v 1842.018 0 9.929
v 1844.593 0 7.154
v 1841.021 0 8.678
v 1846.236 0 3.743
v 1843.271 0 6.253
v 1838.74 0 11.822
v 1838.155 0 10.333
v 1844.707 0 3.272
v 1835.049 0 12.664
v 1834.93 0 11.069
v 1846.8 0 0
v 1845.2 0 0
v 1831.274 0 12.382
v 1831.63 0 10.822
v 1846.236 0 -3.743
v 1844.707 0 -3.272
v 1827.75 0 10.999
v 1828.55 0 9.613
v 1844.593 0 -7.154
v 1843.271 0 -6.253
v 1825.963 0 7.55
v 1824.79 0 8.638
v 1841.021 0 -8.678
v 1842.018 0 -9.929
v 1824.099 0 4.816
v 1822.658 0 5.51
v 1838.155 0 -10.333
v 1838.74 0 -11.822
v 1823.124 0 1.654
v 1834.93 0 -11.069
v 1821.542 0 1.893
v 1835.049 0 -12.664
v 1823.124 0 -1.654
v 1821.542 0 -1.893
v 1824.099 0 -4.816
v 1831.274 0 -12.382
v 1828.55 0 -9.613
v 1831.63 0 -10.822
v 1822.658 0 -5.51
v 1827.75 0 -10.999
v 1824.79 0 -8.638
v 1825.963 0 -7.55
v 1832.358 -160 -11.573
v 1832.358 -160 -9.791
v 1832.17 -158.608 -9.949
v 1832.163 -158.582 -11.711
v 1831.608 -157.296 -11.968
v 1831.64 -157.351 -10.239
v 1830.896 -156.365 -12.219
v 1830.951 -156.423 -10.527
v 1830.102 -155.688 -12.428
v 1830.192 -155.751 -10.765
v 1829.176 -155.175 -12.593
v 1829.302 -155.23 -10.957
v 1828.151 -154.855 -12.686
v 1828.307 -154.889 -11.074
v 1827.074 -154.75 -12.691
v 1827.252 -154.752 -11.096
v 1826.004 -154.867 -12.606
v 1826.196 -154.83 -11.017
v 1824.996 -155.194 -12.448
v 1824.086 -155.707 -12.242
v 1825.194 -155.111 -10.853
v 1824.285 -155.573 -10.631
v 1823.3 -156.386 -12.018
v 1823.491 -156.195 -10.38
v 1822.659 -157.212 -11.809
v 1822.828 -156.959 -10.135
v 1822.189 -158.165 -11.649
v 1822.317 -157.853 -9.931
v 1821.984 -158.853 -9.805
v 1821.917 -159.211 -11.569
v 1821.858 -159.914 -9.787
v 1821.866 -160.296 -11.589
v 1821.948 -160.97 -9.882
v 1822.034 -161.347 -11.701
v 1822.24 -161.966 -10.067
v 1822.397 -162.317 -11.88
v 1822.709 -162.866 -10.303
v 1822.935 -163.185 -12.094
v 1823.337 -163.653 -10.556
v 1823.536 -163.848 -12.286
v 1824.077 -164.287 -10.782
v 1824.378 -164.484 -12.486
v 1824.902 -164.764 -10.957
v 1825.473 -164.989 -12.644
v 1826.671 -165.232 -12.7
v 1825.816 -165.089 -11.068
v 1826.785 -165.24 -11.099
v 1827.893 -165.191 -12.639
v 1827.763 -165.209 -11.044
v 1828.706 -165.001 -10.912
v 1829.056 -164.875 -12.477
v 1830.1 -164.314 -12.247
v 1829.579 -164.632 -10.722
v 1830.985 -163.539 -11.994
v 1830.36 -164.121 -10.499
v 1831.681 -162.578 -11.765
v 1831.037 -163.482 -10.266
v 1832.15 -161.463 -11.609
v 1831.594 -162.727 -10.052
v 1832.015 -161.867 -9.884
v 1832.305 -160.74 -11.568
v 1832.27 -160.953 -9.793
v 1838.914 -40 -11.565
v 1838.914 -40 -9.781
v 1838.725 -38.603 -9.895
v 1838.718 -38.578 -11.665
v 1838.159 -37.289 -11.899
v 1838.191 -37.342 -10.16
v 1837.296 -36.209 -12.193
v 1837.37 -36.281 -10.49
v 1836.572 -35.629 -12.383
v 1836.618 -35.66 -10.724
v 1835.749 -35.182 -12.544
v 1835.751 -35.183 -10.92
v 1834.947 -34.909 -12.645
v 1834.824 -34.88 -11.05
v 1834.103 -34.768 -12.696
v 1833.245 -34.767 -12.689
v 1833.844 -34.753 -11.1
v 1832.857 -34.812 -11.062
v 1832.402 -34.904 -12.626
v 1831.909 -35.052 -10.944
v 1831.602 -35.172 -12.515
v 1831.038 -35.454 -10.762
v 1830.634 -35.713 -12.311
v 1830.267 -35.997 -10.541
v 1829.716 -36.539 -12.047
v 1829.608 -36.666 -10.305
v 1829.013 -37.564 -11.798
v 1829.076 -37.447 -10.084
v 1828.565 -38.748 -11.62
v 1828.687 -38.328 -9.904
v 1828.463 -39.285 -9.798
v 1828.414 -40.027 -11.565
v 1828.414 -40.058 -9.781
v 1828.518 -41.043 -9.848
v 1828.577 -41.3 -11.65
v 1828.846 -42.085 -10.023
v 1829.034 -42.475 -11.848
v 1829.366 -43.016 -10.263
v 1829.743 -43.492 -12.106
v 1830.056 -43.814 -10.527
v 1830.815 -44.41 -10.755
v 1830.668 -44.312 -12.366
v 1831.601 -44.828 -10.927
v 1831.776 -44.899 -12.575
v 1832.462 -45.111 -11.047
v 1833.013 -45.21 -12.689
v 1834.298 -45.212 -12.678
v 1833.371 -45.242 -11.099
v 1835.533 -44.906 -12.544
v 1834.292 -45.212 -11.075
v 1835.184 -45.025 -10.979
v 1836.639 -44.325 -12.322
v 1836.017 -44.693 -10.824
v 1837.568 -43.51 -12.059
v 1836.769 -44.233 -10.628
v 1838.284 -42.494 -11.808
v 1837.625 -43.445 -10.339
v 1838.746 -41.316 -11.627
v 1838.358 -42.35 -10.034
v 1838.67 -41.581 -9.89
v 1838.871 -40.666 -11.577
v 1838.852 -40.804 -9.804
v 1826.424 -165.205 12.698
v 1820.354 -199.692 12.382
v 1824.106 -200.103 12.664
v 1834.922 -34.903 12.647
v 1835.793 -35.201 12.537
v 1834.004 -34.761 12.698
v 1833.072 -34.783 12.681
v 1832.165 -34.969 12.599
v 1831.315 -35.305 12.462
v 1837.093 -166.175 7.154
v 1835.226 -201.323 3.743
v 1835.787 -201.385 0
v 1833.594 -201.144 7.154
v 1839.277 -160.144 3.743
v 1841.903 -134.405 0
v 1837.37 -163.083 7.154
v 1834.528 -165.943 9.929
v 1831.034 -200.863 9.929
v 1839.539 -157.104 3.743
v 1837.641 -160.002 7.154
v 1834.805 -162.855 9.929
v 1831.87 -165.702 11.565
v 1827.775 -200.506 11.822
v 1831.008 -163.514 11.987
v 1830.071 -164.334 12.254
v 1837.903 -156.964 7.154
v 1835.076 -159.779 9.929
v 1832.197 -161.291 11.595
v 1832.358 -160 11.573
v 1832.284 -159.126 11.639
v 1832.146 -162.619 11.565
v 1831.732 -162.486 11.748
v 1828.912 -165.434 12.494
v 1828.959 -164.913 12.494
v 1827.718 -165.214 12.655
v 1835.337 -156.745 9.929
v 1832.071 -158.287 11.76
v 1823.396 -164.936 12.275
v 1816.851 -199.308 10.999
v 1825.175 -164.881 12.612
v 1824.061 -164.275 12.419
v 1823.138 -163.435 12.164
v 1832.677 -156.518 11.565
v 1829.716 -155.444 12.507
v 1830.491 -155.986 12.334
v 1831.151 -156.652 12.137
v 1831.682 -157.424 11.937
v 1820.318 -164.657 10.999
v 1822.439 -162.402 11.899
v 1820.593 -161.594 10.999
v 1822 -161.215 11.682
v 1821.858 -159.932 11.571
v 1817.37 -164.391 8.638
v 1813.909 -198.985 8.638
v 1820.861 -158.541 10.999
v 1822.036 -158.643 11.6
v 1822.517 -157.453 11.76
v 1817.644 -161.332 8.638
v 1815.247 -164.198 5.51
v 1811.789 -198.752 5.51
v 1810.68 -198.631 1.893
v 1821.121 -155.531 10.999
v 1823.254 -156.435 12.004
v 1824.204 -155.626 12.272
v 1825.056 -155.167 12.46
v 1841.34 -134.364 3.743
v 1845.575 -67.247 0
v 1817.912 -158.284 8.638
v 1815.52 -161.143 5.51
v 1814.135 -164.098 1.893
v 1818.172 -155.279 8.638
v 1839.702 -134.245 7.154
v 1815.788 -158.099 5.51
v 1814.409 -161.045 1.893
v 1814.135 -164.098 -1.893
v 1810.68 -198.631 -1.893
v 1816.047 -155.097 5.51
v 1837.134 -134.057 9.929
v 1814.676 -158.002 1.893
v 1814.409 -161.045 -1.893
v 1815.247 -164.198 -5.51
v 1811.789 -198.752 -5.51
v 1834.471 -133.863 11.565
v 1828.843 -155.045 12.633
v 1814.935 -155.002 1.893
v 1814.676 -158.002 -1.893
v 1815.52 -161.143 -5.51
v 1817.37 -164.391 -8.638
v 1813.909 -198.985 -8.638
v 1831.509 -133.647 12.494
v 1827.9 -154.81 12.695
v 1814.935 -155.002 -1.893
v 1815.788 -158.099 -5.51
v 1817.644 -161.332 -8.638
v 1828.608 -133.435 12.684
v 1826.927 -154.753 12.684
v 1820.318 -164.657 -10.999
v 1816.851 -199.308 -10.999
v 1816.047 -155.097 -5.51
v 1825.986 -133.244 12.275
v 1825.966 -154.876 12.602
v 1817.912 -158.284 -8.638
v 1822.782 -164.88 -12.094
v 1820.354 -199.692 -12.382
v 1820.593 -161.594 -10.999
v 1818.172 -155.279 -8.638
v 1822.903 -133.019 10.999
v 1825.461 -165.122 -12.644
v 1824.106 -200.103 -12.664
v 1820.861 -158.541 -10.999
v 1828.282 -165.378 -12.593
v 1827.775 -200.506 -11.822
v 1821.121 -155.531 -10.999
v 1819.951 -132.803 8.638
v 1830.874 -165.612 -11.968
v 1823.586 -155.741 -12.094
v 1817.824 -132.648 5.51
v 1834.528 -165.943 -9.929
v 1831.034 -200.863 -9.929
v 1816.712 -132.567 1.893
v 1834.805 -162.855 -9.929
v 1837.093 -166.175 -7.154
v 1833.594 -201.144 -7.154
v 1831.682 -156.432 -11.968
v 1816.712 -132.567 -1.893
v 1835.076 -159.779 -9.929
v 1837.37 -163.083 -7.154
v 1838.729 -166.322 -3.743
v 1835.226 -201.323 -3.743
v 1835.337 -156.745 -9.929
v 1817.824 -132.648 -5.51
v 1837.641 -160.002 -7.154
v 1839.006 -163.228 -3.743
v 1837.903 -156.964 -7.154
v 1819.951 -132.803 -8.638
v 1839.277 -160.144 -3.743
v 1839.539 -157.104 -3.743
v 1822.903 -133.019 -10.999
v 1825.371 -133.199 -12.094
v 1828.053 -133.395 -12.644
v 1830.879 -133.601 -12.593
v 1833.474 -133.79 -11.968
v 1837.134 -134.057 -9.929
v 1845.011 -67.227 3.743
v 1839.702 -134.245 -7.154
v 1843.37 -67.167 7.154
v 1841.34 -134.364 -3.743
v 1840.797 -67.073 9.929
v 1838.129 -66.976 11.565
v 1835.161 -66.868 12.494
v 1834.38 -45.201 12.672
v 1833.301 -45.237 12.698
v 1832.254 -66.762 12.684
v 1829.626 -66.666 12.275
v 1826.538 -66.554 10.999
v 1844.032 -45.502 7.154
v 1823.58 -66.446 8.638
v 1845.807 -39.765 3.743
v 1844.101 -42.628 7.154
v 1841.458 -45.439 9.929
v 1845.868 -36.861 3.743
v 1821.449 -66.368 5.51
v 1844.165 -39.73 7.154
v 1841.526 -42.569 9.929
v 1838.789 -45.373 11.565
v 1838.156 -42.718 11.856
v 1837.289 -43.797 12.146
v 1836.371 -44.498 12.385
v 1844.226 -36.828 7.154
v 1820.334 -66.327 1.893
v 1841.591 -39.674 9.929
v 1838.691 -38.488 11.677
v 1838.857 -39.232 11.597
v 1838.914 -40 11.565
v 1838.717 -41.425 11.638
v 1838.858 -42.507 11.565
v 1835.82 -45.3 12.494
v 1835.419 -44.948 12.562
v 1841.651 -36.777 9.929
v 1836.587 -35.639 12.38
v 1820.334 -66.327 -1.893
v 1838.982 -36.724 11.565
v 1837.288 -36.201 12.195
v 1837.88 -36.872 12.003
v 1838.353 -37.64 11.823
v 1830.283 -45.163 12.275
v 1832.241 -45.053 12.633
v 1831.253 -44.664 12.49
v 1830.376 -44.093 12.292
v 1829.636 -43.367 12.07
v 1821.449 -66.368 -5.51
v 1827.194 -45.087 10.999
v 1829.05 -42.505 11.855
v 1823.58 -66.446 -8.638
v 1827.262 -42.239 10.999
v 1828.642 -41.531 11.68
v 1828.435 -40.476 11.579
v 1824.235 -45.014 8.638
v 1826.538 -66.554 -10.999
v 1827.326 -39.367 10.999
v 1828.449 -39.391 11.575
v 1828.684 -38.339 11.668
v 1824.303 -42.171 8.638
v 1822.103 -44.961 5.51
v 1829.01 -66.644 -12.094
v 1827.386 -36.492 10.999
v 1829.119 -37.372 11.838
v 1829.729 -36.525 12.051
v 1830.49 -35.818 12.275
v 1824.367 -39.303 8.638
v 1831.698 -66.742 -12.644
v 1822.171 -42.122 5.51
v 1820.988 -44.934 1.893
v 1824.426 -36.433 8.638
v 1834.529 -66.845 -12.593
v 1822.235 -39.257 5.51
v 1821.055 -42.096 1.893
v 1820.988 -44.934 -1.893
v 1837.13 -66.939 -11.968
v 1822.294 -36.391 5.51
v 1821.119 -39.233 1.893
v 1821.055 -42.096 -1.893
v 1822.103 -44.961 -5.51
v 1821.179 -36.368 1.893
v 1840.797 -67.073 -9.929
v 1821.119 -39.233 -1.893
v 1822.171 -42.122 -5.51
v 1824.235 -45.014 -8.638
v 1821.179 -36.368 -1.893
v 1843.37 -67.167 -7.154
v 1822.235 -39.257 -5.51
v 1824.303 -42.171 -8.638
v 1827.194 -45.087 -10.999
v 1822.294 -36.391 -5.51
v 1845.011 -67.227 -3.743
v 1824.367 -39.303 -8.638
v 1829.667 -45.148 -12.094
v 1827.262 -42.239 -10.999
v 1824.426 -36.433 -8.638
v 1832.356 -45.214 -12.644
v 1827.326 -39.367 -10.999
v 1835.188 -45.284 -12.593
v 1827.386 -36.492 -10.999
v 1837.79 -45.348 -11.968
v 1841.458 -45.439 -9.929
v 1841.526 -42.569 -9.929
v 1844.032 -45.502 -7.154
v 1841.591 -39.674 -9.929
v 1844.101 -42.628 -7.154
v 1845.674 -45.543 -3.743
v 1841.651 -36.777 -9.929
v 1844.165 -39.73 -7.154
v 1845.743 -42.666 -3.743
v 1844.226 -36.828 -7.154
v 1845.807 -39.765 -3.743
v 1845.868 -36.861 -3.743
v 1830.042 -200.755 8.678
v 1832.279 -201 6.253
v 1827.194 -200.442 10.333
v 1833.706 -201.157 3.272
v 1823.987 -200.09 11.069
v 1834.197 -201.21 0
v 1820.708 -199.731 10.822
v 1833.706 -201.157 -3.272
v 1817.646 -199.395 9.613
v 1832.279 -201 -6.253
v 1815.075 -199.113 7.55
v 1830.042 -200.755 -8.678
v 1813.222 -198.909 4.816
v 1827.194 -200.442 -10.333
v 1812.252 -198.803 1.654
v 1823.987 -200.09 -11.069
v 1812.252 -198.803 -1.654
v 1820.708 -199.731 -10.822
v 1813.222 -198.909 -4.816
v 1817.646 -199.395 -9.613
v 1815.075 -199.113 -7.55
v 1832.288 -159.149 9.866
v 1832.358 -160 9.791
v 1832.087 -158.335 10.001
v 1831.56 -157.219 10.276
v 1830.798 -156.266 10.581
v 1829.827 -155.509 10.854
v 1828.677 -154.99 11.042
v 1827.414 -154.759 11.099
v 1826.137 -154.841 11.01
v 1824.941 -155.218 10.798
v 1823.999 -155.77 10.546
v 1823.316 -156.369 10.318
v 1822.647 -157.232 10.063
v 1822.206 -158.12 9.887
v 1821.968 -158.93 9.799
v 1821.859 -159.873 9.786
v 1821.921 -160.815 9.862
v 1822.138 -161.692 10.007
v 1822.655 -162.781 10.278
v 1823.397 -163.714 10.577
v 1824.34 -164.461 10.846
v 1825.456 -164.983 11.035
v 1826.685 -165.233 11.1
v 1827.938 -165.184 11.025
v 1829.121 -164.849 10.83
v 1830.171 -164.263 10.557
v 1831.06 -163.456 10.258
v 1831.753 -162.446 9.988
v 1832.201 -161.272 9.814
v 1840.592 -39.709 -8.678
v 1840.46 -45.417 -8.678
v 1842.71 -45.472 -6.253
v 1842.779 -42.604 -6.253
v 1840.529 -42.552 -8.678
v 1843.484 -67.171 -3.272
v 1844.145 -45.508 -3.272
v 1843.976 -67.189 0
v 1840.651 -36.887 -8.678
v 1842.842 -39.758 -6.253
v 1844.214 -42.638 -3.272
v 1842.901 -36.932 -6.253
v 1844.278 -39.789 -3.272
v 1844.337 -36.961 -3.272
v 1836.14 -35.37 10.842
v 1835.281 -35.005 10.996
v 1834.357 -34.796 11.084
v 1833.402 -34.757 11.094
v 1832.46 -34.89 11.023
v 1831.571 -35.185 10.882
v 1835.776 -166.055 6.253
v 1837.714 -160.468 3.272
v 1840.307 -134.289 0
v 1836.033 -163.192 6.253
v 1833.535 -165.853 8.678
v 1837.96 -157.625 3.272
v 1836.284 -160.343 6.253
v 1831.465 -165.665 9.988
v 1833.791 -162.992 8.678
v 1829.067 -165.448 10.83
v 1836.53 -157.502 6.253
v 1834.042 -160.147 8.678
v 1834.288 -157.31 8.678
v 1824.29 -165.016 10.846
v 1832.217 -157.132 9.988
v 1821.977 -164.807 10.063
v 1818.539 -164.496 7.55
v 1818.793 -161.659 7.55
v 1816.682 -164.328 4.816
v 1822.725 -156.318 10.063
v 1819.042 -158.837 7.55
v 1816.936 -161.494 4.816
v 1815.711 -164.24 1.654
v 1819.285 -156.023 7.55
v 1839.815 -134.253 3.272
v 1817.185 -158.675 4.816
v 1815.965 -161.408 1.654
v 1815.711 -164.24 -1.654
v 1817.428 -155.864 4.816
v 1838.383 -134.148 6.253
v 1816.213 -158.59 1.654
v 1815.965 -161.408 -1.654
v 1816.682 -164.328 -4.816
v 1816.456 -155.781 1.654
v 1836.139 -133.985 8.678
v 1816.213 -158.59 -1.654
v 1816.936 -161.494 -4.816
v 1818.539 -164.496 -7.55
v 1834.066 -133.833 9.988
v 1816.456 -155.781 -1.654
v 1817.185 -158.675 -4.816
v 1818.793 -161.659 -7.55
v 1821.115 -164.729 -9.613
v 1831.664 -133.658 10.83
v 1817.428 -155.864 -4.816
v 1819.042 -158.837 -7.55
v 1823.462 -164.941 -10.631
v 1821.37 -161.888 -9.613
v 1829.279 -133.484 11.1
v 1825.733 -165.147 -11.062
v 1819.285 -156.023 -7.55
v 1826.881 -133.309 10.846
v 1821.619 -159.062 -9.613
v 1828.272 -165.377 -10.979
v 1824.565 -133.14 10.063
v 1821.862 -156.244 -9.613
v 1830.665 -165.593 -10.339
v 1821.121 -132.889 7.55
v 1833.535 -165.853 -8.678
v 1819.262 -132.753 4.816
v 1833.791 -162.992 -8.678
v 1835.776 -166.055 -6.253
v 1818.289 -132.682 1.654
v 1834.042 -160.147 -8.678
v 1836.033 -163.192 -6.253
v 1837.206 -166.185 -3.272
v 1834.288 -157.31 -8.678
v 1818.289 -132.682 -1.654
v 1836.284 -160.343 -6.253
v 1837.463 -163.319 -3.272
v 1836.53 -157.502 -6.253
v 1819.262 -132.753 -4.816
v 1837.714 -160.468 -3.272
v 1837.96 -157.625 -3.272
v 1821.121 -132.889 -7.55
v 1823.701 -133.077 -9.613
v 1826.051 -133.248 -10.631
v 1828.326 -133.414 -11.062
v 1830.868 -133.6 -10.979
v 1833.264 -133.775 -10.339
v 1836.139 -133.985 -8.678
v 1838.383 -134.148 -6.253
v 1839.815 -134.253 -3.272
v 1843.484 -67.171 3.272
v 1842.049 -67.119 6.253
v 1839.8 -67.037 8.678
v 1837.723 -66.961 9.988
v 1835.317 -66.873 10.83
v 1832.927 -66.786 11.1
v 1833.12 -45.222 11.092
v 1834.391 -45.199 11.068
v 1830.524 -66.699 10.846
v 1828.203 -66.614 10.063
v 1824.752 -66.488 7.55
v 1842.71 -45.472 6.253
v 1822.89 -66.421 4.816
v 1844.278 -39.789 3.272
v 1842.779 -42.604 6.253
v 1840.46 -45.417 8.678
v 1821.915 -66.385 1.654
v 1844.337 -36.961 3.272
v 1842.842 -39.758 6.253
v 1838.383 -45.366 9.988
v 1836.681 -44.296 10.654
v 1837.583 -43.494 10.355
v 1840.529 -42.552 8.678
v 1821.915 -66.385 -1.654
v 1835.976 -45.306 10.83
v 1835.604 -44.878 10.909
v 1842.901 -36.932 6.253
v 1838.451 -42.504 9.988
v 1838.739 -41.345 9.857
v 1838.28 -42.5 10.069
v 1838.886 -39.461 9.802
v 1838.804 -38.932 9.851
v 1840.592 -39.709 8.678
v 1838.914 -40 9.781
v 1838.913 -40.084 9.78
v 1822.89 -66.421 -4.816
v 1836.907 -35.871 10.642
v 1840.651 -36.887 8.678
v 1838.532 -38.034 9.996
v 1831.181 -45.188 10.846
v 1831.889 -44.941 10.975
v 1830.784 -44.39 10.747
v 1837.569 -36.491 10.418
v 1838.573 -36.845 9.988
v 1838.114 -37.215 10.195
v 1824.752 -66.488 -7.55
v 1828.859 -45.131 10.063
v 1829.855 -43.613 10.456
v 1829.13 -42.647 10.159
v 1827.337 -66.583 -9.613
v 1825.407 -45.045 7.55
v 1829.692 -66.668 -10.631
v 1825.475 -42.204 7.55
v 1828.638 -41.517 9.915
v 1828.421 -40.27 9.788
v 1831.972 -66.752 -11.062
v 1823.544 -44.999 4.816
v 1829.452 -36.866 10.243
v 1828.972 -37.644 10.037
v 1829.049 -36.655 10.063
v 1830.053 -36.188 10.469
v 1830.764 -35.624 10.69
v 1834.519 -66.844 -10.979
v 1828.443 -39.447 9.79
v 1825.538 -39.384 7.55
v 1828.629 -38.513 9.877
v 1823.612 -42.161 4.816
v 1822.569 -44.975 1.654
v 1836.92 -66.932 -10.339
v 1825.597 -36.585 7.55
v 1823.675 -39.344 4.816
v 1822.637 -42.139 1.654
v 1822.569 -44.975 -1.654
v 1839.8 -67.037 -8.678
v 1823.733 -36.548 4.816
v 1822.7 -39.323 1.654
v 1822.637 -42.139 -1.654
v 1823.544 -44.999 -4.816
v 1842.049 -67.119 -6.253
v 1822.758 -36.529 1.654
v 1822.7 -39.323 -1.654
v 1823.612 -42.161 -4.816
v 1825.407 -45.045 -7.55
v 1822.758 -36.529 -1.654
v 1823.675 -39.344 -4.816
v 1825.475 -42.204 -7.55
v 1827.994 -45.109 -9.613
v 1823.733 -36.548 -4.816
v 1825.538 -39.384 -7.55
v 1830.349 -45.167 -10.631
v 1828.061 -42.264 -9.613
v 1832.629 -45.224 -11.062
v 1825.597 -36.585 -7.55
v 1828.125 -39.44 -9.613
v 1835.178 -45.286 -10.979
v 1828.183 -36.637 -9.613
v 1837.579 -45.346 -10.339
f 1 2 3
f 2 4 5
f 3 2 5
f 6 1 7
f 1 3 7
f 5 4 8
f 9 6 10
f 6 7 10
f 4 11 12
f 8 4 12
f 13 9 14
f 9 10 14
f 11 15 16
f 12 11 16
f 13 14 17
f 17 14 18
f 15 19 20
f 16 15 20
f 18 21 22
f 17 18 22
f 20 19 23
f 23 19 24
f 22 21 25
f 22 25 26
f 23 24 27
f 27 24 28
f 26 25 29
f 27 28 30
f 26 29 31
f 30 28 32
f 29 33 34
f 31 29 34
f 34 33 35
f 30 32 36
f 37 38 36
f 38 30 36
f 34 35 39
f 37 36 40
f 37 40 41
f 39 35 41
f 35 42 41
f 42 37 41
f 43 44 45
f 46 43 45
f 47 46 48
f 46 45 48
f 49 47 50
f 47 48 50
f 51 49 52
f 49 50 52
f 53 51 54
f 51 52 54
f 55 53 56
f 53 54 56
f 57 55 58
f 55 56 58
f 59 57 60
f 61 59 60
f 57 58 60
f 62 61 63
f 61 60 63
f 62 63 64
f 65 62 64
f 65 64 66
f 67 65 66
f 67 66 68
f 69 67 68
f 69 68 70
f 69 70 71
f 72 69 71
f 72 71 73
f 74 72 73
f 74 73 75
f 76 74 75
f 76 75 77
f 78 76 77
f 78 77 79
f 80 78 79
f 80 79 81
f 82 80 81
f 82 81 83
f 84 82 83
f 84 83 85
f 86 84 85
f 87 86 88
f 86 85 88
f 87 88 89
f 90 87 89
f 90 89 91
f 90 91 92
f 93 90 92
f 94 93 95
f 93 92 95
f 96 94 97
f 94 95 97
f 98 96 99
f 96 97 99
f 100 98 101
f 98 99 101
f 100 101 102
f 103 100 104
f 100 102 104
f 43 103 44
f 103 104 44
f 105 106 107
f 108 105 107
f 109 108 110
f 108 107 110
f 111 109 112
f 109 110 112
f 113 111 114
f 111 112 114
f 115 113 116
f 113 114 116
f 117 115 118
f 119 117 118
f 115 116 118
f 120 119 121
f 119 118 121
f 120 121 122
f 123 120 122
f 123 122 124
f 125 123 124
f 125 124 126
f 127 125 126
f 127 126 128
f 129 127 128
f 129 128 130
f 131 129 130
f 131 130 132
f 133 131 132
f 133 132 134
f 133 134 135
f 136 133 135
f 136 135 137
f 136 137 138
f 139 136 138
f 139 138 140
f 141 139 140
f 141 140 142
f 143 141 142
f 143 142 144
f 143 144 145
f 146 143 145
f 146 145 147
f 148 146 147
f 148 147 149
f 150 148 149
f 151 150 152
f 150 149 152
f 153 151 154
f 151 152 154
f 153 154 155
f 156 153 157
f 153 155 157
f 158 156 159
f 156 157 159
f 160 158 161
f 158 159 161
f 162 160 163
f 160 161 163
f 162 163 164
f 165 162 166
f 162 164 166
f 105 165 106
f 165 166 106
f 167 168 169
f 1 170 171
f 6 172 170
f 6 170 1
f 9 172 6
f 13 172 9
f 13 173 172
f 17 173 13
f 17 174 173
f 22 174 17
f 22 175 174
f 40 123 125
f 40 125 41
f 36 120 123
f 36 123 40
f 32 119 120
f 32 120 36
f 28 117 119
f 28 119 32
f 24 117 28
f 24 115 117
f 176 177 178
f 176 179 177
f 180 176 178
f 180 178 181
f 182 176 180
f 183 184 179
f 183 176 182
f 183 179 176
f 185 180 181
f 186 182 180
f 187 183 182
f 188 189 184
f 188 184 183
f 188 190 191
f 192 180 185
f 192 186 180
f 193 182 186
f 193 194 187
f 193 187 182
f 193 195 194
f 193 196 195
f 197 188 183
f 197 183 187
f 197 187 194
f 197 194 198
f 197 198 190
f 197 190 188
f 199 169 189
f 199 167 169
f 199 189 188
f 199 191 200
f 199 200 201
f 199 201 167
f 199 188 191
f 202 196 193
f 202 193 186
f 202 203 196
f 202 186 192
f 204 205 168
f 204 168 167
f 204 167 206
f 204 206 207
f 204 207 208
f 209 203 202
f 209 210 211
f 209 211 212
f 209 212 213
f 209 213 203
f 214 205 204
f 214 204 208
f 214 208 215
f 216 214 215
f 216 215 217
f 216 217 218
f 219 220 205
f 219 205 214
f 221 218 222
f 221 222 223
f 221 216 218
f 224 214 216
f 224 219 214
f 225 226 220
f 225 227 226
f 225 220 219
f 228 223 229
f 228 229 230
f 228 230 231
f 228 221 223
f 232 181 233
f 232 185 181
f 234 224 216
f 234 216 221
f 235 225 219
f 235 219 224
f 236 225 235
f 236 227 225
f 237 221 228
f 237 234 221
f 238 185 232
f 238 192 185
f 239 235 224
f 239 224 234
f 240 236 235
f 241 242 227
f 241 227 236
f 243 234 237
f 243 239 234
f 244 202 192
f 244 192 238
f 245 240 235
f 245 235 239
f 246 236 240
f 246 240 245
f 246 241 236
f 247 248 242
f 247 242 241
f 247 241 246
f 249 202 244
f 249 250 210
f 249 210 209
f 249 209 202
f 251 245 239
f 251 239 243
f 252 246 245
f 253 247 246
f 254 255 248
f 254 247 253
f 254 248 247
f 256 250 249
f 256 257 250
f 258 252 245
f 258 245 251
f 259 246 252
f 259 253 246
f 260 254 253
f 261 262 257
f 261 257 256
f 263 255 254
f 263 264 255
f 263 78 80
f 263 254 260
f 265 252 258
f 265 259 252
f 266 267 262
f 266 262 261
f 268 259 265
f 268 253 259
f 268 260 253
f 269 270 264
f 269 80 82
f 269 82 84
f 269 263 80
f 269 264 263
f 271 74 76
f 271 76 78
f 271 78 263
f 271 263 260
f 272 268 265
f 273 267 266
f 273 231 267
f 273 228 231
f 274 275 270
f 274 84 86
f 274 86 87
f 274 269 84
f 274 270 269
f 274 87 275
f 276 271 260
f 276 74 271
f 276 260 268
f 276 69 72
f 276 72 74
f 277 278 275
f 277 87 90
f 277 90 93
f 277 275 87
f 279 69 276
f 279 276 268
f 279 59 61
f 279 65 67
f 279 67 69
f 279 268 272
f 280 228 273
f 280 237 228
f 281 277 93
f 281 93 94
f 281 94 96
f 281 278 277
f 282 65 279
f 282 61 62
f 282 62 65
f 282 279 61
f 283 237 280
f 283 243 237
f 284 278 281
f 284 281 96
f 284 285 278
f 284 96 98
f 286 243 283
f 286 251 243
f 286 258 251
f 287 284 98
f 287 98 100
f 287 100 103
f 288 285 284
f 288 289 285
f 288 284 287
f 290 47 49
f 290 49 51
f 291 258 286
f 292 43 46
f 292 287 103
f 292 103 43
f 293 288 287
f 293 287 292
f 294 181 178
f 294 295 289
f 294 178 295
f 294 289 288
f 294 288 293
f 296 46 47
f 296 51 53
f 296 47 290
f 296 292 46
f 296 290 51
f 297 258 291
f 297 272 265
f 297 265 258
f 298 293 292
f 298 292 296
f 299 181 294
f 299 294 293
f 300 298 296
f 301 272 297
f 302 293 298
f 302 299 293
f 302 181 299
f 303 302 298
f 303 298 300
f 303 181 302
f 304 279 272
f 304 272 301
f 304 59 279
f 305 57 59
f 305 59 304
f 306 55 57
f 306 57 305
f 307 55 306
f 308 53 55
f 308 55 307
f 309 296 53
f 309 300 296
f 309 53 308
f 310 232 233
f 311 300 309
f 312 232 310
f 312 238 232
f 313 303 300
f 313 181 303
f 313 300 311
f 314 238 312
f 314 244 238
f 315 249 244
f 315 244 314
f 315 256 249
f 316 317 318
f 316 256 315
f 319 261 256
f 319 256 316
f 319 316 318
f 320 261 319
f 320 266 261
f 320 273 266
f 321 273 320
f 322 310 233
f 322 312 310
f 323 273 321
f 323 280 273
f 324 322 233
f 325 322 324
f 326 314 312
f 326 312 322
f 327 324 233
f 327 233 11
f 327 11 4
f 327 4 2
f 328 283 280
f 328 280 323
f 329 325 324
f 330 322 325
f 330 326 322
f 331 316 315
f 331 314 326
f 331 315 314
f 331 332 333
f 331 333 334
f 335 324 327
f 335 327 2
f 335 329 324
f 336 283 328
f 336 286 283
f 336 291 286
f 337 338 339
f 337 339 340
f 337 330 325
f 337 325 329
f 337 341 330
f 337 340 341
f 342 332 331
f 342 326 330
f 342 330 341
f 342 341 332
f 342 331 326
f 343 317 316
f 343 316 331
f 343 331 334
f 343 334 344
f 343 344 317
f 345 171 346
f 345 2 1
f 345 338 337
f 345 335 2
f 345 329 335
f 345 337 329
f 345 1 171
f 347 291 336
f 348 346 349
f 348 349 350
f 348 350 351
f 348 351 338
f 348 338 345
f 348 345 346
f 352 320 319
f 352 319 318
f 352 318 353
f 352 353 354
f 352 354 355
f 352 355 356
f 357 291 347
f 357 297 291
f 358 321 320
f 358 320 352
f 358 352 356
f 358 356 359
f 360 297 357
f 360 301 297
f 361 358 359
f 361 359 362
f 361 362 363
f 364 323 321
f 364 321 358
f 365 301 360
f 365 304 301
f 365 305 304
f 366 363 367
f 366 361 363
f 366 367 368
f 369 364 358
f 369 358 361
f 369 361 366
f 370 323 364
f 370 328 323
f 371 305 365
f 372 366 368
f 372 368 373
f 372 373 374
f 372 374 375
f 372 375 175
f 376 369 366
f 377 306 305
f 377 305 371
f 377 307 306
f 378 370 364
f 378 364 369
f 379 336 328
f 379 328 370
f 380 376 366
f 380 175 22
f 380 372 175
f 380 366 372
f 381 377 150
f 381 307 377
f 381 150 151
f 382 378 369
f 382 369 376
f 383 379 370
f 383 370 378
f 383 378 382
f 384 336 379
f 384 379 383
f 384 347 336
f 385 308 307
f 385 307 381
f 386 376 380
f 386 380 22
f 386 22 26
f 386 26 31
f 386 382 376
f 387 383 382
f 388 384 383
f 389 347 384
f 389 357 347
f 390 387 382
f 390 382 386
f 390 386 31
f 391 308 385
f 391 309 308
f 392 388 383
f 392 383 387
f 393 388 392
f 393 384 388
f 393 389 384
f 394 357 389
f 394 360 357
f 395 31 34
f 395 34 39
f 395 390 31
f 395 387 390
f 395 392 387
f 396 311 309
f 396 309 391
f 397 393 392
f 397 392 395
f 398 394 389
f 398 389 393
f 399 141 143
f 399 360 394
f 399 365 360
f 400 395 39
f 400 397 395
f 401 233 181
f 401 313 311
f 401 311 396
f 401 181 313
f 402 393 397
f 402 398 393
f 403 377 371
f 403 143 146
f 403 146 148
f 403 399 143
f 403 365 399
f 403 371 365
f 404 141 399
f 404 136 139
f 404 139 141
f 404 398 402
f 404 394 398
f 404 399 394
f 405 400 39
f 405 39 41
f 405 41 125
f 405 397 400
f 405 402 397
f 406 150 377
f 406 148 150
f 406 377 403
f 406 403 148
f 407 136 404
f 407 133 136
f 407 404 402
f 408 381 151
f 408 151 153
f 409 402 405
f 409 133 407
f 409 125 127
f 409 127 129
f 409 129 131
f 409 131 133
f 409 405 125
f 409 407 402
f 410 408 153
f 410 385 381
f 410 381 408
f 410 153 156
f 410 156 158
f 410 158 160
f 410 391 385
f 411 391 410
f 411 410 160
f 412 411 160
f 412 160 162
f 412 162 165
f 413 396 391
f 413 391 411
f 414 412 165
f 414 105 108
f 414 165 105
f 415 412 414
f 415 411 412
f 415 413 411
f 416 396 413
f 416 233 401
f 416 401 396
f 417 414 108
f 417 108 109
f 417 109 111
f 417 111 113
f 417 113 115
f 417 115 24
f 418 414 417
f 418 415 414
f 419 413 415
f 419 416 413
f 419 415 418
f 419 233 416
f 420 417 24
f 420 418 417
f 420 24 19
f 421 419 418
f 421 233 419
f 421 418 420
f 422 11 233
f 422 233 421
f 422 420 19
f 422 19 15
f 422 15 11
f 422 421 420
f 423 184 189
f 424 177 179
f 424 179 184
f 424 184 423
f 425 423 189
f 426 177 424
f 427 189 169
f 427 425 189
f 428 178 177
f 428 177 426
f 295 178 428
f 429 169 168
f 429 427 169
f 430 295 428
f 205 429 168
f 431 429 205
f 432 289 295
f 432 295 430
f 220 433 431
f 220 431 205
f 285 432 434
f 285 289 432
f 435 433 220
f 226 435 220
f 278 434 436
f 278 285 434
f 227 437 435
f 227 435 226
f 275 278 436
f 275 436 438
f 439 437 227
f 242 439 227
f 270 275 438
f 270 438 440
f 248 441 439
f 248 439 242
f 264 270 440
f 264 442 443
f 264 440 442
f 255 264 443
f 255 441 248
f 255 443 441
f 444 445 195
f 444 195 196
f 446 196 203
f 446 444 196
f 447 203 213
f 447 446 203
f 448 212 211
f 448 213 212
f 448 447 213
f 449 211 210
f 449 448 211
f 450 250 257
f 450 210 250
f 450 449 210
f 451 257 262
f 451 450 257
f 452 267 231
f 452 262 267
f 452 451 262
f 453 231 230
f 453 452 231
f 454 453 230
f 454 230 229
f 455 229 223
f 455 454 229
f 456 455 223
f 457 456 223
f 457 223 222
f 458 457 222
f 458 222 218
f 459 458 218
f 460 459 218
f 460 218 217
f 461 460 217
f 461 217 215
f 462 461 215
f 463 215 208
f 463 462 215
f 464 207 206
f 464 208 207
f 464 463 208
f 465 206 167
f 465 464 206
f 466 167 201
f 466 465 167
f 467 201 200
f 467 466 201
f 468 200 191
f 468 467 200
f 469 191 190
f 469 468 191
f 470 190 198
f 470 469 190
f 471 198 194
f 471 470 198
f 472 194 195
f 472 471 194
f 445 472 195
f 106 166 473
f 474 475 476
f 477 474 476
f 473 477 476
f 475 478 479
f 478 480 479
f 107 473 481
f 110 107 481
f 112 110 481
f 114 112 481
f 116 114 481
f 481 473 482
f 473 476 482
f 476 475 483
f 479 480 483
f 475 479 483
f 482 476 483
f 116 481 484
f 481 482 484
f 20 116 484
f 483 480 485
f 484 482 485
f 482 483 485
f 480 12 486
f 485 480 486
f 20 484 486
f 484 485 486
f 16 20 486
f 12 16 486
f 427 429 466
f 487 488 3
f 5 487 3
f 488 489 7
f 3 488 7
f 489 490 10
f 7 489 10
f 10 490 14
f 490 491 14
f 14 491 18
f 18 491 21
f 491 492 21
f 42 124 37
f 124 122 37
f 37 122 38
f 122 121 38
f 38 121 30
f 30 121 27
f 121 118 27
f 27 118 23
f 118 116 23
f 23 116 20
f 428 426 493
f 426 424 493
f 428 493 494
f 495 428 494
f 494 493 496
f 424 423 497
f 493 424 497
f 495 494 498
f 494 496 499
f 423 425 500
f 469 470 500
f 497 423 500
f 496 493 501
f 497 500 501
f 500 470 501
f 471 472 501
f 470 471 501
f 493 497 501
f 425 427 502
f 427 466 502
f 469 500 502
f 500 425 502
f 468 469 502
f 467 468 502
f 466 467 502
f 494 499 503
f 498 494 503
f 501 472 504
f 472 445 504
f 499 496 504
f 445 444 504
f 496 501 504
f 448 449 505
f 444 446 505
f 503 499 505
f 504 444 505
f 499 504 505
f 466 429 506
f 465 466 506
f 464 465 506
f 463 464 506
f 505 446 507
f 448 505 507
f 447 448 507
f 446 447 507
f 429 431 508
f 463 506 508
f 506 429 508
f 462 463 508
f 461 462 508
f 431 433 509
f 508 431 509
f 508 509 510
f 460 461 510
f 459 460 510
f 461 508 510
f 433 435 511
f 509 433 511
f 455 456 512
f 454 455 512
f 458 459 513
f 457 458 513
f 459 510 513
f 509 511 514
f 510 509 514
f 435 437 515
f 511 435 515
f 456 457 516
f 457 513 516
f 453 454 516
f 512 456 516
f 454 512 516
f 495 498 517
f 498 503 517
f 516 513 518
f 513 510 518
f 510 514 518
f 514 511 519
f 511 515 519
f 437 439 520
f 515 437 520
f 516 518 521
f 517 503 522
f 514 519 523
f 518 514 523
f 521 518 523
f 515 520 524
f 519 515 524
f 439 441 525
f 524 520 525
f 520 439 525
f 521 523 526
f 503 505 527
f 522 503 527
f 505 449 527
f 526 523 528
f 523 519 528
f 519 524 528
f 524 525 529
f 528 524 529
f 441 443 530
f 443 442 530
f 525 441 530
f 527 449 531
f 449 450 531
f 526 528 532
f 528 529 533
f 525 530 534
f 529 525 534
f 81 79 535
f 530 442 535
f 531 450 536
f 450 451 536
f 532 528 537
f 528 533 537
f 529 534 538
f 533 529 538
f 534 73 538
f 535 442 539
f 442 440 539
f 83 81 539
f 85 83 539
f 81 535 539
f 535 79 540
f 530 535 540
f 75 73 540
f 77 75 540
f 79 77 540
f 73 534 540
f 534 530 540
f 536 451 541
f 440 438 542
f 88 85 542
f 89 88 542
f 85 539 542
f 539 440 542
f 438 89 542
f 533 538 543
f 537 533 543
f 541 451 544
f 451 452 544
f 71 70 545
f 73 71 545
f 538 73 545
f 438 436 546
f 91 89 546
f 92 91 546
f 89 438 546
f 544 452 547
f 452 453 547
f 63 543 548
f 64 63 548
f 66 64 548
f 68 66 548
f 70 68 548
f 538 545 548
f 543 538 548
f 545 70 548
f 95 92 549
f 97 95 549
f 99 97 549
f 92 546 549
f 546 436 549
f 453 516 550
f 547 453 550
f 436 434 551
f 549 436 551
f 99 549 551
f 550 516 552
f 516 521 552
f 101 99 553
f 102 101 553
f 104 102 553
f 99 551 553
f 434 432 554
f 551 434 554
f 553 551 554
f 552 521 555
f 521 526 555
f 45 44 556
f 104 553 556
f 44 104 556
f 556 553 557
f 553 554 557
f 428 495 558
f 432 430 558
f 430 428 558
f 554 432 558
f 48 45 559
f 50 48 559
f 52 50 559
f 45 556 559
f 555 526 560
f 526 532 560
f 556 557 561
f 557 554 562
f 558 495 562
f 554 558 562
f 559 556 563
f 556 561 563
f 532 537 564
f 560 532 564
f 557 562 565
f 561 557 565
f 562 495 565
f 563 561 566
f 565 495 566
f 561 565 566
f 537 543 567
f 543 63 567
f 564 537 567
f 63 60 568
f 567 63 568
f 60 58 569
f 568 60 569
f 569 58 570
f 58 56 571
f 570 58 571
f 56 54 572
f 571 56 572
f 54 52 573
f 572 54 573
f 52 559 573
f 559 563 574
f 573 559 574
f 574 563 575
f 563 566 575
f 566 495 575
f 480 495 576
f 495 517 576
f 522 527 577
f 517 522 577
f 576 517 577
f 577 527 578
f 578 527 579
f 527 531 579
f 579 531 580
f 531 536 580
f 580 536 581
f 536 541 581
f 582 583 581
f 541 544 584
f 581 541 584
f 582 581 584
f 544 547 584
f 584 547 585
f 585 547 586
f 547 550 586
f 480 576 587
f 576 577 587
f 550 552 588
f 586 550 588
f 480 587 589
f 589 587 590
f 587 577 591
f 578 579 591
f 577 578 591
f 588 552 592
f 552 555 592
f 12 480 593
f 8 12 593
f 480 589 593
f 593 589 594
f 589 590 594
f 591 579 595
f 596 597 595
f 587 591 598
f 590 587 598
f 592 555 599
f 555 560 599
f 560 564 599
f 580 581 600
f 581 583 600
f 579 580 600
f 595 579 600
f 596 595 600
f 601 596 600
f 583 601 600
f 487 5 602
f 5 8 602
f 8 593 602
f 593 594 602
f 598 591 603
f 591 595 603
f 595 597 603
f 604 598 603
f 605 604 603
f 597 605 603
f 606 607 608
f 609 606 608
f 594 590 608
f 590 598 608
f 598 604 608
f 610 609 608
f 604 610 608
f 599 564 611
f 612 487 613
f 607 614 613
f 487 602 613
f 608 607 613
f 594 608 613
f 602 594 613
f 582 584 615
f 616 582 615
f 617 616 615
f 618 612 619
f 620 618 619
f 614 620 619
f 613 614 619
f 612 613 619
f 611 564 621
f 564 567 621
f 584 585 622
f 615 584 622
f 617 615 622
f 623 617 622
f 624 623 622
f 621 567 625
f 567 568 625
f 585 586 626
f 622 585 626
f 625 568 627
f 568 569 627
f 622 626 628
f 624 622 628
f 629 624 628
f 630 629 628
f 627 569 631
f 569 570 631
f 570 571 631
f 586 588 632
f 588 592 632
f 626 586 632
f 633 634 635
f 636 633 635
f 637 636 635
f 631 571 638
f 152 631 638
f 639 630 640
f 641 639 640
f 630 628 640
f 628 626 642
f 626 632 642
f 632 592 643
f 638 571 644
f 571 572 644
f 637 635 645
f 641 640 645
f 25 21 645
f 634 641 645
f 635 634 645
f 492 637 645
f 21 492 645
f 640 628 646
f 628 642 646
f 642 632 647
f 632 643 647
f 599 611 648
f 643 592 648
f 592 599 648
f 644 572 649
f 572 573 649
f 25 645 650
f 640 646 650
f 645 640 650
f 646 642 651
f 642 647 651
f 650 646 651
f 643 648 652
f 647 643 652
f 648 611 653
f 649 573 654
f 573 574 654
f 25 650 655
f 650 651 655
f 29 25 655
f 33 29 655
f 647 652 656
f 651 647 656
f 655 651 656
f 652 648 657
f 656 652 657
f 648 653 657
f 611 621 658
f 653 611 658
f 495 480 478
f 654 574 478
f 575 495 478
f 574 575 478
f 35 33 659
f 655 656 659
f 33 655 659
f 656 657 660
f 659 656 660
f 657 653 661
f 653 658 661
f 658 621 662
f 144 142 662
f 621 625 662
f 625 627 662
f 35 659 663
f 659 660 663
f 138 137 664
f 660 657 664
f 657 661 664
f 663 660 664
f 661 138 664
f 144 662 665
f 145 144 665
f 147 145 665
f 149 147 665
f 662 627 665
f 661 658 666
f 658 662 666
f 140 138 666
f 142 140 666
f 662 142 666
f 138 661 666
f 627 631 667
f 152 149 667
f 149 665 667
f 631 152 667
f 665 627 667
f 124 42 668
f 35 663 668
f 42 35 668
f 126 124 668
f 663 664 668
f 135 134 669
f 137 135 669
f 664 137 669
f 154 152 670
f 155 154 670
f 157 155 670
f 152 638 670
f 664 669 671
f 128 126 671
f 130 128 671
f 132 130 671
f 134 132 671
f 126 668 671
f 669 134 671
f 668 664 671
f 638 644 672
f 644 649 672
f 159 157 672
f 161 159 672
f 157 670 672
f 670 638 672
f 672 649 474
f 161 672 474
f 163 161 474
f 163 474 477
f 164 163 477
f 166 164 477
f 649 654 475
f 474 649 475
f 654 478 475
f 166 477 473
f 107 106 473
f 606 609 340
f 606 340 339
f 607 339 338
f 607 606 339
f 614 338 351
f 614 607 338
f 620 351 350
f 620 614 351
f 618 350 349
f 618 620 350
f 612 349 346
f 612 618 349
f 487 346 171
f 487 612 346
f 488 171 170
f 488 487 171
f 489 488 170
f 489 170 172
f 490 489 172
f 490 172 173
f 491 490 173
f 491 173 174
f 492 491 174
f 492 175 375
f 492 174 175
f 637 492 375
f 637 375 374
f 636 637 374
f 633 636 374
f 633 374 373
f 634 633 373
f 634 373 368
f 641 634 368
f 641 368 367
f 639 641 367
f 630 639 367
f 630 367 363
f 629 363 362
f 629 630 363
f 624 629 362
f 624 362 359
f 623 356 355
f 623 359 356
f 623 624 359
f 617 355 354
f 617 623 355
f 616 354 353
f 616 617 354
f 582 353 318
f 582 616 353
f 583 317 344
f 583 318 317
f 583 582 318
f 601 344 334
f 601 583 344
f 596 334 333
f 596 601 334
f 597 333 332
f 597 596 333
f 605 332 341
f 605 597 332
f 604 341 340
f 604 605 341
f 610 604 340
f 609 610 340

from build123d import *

# Parameters (mm, degrees)
F1_R          = 12.7
F1_R_2        = 11.1
F3_R          = 5.25
F4_DEPTH      = 12.7010001
F4_DEPTH_BACK = 12.7010001


with BuildPart() as f2:
    # F2: sweep along a path in F0
    with BuildLine(Plane.XY) as f2_path:
        ThreePointArc((1823.1628588801, -200), (1831.3636735329, -100.1494146961), (1834.1, 0))
    # F1 (on Front) → F2 (sweep)
    with BuildSketch(Plane.XZ):
        with Locations((1834.1, 0)):
            Circle(F1_R)
        with Locations((1834.1, 0)):
            Circle(F1_R_2, mode=Mode.SUBTRACT)
    sweep(path=f2_path.line)

    # F3 (on Top) → F4 (cut, two sides)
    with BuildSketch(Plane.XY) as f4_sk:
        with Locations((1833.6637668886, -40)):
            Circle(F3_R)
        with Locations((1827.1077718624, -160)):
            Circle(F3_R)
    extrude(amount=-F4_DEPTH, mode=Mode.SUBTRACT)
    extrude(f4_sk.sketch, amount=F4_DEPTH_BACK, mode=Mode.SUBTRACT)


solid = f2.part
